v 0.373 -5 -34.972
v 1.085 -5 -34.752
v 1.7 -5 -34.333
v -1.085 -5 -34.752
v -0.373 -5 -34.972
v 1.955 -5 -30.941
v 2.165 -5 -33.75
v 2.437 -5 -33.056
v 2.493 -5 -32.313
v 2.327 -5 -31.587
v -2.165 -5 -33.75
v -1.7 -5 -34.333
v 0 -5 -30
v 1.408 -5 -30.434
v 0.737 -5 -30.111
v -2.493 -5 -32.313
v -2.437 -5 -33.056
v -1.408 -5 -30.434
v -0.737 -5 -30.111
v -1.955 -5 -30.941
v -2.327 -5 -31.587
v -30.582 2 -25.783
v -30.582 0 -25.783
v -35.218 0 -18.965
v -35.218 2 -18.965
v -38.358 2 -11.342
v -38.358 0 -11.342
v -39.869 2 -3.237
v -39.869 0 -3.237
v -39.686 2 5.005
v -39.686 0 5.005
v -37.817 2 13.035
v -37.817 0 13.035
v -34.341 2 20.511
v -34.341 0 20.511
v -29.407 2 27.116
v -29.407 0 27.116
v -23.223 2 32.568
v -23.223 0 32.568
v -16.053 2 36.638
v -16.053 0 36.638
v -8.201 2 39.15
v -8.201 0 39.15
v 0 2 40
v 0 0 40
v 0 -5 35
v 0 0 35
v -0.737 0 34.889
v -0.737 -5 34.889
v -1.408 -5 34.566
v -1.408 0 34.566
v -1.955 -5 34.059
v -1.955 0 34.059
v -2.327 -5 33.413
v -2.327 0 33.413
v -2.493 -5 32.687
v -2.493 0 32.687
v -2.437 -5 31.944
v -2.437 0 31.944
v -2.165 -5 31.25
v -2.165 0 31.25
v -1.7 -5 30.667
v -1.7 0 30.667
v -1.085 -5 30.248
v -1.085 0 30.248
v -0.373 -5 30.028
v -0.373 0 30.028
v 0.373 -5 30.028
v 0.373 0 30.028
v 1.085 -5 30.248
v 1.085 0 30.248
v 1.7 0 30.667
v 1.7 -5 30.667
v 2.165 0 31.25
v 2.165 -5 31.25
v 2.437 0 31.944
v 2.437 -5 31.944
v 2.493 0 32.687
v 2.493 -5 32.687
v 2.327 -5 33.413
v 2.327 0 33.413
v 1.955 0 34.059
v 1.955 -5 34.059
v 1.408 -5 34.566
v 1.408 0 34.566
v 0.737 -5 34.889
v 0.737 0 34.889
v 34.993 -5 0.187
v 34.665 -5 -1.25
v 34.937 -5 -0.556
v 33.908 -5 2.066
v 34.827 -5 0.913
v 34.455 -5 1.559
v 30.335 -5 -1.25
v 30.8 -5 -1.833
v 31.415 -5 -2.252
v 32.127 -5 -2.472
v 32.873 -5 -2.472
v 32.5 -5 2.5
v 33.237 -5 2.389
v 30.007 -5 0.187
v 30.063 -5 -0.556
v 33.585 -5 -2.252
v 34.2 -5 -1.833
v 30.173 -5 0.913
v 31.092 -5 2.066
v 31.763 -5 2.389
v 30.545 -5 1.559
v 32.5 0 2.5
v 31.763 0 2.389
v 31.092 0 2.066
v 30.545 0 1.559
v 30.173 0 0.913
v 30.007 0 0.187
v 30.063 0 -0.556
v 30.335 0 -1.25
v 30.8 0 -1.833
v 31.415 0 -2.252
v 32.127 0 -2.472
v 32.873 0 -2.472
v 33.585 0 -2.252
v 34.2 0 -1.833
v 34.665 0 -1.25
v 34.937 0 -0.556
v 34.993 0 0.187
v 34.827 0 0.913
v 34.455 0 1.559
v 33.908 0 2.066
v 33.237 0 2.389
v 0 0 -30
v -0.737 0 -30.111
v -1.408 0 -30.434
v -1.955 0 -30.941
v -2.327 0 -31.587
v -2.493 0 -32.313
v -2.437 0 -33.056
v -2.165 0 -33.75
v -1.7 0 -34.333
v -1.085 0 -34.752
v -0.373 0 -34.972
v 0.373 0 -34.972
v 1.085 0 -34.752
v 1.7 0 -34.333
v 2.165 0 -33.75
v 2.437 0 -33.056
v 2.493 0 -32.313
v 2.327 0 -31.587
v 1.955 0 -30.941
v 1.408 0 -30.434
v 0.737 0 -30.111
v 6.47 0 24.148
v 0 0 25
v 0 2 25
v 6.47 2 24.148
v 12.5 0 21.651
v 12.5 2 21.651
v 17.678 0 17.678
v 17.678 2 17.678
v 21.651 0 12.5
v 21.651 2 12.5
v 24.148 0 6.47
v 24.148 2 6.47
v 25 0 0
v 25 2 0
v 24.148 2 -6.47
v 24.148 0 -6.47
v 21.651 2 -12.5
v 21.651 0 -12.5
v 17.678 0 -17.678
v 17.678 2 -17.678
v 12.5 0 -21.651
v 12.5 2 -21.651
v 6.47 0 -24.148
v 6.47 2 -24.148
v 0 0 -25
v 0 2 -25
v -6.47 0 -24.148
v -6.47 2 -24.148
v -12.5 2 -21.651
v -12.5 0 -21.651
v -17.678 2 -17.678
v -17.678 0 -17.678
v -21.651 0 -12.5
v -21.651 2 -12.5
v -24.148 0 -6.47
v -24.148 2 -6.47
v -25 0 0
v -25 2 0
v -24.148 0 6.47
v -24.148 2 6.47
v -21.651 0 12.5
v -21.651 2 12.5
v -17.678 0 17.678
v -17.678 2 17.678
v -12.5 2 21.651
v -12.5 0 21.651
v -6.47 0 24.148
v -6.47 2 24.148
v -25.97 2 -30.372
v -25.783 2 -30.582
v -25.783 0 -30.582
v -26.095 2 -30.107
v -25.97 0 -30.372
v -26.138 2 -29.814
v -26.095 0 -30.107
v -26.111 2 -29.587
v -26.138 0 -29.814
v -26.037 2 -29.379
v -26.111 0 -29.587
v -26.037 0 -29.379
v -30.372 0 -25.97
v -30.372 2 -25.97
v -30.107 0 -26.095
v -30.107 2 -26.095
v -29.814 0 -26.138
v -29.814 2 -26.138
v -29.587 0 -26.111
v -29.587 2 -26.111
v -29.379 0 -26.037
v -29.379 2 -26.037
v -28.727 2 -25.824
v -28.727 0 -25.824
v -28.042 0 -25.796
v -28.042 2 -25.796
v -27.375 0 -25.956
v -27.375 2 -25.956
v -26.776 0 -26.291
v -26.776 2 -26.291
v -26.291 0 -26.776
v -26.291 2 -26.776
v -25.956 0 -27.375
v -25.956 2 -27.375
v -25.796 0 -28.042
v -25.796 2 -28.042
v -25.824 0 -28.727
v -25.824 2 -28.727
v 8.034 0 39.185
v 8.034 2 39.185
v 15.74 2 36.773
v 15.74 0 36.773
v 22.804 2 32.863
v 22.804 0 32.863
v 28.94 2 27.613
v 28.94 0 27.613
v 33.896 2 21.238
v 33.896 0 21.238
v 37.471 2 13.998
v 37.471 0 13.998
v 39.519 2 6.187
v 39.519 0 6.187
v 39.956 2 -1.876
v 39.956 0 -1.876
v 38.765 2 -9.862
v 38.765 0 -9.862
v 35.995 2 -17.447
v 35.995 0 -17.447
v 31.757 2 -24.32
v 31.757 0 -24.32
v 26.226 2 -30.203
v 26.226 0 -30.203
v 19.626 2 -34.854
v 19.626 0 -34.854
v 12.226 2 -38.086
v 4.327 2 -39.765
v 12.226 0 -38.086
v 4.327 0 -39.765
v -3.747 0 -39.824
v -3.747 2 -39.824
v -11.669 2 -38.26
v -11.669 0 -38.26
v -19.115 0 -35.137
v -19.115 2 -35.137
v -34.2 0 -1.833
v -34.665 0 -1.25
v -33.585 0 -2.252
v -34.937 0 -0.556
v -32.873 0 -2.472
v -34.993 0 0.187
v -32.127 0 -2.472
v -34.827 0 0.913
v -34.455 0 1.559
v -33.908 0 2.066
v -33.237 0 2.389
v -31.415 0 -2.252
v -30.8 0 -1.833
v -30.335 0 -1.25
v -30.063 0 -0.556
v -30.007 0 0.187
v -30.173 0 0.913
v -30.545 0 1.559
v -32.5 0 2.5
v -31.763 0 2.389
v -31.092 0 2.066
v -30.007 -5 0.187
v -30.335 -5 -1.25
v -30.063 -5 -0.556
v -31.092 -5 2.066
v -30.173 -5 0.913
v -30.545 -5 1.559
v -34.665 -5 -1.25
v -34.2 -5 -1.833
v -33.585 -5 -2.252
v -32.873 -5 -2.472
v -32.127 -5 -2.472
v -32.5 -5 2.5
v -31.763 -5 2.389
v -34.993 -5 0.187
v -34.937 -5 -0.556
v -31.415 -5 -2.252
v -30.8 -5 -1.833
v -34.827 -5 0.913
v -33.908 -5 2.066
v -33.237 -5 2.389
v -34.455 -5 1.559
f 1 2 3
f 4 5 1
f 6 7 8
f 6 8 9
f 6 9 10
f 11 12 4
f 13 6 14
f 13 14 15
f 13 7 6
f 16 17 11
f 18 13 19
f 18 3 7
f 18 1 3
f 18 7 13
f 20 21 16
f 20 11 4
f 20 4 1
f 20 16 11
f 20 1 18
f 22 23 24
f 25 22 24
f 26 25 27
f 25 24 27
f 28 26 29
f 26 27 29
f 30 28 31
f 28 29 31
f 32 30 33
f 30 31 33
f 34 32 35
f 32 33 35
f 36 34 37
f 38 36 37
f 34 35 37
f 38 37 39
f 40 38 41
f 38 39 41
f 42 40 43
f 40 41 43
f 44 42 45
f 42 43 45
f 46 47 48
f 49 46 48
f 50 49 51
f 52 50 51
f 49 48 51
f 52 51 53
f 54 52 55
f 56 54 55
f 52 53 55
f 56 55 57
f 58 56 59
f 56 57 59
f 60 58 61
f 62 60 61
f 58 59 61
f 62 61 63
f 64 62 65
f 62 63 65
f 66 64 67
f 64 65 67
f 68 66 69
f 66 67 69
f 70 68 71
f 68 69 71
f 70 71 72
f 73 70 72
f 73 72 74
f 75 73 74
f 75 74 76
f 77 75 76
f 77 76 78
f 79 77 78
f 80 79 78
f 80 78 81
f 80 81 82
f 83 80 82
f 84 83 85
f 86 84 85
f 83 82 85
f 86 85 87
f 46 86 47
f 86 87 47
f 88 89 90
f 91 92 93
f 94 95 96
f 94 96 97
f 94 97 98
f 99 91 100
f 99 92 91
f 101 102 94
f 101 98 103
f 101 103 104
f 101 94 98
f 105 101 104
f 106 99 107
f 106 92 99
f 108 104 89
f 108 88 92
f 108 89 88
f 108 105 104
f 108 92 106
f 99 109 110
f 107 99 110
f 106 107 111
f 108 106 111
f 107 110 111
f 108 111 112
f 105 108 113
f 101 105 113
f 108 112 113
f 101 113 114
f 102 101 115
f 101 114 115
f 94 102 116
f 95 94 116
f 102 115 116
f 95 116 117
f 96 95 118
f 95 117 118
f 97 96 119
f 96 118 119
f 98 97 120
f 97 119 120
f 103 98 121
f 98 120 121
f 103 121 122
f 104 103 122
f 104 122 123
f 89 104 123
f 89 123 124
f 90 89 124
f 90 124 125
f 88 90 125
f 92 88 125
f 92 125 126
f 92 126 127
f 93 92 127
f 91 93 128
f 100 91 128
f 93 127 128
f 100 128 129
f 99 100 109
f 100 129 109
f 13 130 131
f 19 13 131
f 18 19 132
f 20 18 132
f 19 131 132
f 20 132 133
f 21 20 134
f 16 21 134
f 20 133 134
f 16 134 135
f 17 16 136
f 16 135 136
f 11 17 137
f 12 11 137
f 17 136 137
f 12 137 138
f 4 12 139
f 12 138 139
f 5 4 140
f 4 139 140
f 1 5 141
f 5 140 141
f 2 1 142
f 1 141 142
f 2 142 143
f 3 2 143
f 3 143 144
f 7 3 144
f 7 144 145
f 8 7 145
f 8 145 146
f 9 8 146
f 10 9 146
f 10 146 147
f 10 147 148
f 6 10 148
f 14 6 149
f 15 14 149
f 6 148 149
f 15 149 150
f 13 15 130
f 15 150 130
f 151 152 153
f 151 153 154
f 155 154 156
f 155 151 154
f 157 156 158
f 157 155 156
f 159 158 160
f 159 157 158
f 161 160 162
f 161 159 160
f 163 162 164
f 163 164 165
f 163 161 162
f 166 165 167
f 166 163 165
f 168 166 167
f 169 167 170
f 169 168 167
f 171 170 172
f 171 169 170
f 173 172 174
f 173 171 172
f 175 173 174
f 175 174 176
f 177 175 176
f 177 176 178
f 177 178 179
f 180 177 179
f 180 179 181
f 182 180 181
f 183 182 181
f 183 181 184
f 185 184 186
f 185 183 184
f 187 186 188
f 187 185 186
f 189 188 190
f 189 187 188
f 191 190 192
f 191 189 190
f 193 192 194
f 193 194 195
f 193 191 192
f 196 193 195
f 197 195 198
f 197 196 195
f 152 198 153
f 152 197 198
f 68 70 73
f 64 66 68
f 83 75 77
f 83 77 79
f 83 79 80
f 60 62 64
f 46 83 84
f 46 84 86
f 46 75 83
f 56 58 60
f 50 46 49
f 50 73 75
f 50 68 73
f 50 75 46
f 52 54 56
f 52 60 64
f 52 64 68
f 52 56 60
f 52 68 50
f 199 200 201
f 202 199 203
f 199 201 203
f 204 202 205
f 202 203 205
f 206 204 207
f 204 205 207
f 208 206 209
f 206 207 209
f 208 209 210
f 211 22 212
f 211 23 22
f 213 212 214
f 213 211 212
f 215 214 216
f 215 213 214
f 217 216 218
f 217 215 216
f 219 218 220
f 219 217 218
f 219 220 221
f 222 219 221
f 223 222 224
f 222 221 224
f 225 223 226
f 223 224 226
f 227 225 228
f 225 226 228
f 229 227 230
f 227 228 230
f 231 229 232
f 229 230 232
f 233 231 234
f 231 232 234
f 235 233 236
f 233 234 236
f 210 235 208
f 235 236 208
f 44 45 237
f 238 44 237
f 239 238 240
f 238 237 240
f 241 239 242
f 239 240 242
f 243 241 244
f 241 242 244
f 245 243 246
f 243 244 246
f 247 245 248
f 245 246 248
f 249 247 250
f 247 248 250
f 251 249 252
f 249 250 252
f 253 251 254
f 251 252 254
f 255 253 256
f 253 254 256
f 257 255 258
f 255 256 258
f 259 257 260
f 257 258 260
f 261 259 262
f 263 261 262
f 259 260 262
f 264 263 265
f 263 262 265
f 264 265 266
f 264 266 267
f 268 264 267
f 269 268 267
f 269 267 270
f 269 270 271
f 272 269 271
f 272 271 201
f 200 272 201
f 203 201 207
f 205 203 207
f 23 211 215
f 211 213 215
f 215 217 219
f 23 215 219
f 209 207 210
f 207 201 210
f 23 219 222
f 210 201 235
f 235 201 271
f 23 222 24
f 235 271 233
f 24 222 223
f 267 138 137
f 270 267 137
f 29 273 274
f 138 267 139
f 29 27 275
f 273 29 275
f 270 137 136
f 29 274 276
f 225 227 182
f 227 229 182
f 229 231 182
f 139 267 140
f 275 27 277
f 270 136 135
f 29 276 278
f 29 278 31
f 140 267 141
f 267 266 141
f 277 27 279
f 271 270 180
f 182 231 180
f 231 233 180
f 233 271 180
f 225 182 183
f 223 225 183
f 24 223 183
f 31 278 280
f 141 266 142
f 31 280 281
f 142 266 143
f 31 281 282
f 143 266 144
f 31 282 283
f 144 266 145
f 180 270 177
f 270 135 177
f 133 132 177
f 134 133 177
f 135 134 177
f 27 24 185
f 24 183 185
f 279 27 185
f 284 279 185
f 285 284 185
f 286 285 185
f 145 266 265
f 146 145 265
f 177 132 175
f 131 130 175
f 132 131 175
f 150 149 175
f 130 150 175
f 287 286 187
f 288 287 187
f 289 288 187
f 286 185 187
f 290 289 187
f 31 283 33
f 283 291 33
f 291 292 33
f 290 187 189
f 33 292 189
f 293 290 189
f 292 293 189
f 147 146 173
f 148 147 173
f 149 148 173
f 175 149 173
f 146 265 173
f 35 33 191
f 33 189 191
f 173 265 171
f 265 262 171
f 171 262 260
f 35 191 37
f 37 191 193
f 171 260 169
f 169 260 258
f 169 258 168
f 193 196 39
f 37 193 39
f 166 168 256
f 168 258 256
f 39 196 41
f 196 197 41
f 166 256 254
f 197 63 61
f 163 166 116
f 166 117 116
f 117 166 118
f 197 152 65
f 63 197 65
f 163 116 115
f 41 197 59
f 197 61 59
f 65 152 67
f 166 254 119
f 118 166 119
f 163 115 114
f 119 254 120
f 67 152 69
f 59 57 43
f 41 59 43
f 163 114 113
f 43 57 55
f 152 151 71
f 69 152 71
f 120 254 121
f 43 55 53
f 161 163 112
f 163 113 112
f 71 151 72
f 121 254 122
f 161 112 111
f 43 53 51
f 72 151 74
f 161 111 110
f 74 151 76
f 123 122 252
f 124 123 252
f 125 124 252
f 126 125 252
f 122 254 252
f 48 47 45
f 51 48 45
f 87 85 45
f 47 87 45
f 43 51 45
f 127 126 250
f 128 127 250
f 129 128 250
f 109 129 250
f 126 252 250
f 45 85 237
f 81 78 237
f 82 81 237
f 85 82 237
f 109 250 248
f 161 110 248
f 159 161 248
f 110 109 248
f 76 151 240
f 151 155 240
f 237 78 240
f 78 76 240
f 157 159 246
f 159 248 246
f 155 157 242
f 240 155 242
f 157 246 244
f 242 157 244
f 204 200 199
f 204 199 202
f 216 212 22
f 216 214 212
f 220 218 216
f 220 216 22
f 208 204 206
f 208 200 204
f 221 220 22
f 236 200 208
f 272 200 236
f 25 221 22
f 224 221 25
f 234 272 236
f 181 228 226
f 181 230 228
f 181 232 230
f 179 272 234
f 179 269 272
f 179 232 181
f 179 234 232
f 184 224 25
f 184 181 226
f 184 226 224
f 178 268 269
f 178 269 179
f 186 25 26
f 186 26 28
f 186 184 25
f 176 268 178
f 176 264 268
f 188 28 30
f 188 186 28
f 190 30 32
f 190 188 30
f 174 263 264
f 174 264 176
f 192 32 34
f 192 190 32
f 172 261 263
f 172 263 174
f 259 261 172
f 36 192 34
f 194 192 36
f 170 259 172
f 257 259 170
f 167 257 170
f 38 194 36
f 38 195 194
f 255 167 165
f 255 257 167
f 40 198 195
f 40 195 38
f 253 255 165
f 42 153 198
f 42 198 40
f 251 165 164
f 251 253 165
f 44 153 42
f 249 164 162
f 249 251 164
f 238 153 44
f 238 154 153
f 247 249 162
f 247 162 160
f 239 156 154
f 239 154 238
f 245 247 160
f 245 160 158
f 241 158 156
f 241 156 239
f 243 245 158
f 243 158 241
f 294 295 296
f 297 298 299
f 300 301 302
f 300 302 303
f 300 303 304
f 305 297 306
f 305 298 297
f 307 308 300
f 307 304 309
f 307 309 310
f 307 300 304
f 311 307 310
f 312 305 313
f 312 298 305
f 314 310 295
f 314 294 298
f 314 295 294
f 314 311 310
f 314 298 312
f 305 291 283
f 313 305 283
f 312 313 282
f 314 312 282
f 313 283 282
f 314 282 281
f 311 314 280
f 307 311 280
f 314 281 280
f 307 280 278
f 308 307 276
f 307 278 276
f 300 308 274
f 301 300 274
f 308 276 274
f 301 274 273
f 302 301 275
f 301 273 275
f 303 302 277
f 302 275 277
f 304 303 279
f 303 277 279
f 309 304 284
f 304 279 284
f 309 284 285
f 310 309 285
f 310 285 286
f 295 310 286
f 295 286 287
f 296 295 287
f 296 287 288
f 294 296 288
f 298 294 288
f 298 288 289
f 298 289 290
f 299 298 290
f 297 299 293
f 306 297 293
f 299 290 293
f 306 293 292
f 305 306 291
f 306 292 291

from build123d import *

# Parameters (mm, degrees)
SKETCH2_R           = 40
SKETCH2_R_2         = 25
BOSS_EXTRUDE2_DEPTH = 2
SKETCH4_R           = 2.5
BOSS_EXTRUDE3_DEPTH = 5
SKETCH5_R           = 2.5
CUT_EXTRUDE1_DEPTH  = 10
FILLET1_R           = 1
FILLET2_R           = 1


with BuildPart() as part:
    # Sketch2 → Boss-Extrude2 (new body)
    with BuildSketch(Plane(origin=(0, 0, 0), x_dir=(1, 0, 0), z_dir=(0, 1, 0))):
        with Locations(Location((0, 0, 0), (0, 0, 270))):
            Circle(SKETCH2_R)
        with Locations(Location((0, 0, 0), (0, 0, 270))):
            Circle(SKETCH2_R_2, mode=Mode.SUBTRACT)
    extrude(amount=BOSS_EXTRUDE2_DEPTH)

    # Sketch4 → Boss-Extrude3 (add)
    with BuildSketch(Plane.XZ):
        with Locations(Location((0, -32.5, 0), (0, 0, 90))):
            Circle(SKETCH4_R)
        with Locations(Location((32.5, 0, 0), (0, 0, 90))):
            Circle(SKETCH4_R)
        with Locations(Location((0, 32.5, 0), (0, 0, 90))):
            Circle(SKETCH4_R)
        with Locations(Location((-32.5, 0, 0), (0, 0, 90))):
            Circle(SKETCH4_R)
    extrude(amount=BOSS_EXTRUDE3_DEPTH)

    # Sketch5 → Cut-Extrude1 (cut)
    with BuildSketch(Plane(origin=(0, 2, 0), x_dir=(1, 0, 0), z_dir=(0, 1, 0))):
        with Locations((-28.284271247, 28.284271247)):
            Circle(SKETCH5_R)
    extrude(amount=-CUT_EXTRUDE1_DEPTH, mode=Mode.SUBTRACT)

    # Fillet1
    fillet1_edges = [part.edges().sort_by_distance(p)[0] for p in [
        (-26.462124956, 1, -29.995932105),
    ]]
    fillet(fillet1_edges, radius=FILLET1_R)

    # Fillet2
    fillet2_edges = [part.edges().sort_by_distance(p)[0] for p in [
        (-29.995932105, 1, -26.462124956),
    ]]
    fillet(fillet2_edges, radius=FILLET2_R)


solid = part.part
